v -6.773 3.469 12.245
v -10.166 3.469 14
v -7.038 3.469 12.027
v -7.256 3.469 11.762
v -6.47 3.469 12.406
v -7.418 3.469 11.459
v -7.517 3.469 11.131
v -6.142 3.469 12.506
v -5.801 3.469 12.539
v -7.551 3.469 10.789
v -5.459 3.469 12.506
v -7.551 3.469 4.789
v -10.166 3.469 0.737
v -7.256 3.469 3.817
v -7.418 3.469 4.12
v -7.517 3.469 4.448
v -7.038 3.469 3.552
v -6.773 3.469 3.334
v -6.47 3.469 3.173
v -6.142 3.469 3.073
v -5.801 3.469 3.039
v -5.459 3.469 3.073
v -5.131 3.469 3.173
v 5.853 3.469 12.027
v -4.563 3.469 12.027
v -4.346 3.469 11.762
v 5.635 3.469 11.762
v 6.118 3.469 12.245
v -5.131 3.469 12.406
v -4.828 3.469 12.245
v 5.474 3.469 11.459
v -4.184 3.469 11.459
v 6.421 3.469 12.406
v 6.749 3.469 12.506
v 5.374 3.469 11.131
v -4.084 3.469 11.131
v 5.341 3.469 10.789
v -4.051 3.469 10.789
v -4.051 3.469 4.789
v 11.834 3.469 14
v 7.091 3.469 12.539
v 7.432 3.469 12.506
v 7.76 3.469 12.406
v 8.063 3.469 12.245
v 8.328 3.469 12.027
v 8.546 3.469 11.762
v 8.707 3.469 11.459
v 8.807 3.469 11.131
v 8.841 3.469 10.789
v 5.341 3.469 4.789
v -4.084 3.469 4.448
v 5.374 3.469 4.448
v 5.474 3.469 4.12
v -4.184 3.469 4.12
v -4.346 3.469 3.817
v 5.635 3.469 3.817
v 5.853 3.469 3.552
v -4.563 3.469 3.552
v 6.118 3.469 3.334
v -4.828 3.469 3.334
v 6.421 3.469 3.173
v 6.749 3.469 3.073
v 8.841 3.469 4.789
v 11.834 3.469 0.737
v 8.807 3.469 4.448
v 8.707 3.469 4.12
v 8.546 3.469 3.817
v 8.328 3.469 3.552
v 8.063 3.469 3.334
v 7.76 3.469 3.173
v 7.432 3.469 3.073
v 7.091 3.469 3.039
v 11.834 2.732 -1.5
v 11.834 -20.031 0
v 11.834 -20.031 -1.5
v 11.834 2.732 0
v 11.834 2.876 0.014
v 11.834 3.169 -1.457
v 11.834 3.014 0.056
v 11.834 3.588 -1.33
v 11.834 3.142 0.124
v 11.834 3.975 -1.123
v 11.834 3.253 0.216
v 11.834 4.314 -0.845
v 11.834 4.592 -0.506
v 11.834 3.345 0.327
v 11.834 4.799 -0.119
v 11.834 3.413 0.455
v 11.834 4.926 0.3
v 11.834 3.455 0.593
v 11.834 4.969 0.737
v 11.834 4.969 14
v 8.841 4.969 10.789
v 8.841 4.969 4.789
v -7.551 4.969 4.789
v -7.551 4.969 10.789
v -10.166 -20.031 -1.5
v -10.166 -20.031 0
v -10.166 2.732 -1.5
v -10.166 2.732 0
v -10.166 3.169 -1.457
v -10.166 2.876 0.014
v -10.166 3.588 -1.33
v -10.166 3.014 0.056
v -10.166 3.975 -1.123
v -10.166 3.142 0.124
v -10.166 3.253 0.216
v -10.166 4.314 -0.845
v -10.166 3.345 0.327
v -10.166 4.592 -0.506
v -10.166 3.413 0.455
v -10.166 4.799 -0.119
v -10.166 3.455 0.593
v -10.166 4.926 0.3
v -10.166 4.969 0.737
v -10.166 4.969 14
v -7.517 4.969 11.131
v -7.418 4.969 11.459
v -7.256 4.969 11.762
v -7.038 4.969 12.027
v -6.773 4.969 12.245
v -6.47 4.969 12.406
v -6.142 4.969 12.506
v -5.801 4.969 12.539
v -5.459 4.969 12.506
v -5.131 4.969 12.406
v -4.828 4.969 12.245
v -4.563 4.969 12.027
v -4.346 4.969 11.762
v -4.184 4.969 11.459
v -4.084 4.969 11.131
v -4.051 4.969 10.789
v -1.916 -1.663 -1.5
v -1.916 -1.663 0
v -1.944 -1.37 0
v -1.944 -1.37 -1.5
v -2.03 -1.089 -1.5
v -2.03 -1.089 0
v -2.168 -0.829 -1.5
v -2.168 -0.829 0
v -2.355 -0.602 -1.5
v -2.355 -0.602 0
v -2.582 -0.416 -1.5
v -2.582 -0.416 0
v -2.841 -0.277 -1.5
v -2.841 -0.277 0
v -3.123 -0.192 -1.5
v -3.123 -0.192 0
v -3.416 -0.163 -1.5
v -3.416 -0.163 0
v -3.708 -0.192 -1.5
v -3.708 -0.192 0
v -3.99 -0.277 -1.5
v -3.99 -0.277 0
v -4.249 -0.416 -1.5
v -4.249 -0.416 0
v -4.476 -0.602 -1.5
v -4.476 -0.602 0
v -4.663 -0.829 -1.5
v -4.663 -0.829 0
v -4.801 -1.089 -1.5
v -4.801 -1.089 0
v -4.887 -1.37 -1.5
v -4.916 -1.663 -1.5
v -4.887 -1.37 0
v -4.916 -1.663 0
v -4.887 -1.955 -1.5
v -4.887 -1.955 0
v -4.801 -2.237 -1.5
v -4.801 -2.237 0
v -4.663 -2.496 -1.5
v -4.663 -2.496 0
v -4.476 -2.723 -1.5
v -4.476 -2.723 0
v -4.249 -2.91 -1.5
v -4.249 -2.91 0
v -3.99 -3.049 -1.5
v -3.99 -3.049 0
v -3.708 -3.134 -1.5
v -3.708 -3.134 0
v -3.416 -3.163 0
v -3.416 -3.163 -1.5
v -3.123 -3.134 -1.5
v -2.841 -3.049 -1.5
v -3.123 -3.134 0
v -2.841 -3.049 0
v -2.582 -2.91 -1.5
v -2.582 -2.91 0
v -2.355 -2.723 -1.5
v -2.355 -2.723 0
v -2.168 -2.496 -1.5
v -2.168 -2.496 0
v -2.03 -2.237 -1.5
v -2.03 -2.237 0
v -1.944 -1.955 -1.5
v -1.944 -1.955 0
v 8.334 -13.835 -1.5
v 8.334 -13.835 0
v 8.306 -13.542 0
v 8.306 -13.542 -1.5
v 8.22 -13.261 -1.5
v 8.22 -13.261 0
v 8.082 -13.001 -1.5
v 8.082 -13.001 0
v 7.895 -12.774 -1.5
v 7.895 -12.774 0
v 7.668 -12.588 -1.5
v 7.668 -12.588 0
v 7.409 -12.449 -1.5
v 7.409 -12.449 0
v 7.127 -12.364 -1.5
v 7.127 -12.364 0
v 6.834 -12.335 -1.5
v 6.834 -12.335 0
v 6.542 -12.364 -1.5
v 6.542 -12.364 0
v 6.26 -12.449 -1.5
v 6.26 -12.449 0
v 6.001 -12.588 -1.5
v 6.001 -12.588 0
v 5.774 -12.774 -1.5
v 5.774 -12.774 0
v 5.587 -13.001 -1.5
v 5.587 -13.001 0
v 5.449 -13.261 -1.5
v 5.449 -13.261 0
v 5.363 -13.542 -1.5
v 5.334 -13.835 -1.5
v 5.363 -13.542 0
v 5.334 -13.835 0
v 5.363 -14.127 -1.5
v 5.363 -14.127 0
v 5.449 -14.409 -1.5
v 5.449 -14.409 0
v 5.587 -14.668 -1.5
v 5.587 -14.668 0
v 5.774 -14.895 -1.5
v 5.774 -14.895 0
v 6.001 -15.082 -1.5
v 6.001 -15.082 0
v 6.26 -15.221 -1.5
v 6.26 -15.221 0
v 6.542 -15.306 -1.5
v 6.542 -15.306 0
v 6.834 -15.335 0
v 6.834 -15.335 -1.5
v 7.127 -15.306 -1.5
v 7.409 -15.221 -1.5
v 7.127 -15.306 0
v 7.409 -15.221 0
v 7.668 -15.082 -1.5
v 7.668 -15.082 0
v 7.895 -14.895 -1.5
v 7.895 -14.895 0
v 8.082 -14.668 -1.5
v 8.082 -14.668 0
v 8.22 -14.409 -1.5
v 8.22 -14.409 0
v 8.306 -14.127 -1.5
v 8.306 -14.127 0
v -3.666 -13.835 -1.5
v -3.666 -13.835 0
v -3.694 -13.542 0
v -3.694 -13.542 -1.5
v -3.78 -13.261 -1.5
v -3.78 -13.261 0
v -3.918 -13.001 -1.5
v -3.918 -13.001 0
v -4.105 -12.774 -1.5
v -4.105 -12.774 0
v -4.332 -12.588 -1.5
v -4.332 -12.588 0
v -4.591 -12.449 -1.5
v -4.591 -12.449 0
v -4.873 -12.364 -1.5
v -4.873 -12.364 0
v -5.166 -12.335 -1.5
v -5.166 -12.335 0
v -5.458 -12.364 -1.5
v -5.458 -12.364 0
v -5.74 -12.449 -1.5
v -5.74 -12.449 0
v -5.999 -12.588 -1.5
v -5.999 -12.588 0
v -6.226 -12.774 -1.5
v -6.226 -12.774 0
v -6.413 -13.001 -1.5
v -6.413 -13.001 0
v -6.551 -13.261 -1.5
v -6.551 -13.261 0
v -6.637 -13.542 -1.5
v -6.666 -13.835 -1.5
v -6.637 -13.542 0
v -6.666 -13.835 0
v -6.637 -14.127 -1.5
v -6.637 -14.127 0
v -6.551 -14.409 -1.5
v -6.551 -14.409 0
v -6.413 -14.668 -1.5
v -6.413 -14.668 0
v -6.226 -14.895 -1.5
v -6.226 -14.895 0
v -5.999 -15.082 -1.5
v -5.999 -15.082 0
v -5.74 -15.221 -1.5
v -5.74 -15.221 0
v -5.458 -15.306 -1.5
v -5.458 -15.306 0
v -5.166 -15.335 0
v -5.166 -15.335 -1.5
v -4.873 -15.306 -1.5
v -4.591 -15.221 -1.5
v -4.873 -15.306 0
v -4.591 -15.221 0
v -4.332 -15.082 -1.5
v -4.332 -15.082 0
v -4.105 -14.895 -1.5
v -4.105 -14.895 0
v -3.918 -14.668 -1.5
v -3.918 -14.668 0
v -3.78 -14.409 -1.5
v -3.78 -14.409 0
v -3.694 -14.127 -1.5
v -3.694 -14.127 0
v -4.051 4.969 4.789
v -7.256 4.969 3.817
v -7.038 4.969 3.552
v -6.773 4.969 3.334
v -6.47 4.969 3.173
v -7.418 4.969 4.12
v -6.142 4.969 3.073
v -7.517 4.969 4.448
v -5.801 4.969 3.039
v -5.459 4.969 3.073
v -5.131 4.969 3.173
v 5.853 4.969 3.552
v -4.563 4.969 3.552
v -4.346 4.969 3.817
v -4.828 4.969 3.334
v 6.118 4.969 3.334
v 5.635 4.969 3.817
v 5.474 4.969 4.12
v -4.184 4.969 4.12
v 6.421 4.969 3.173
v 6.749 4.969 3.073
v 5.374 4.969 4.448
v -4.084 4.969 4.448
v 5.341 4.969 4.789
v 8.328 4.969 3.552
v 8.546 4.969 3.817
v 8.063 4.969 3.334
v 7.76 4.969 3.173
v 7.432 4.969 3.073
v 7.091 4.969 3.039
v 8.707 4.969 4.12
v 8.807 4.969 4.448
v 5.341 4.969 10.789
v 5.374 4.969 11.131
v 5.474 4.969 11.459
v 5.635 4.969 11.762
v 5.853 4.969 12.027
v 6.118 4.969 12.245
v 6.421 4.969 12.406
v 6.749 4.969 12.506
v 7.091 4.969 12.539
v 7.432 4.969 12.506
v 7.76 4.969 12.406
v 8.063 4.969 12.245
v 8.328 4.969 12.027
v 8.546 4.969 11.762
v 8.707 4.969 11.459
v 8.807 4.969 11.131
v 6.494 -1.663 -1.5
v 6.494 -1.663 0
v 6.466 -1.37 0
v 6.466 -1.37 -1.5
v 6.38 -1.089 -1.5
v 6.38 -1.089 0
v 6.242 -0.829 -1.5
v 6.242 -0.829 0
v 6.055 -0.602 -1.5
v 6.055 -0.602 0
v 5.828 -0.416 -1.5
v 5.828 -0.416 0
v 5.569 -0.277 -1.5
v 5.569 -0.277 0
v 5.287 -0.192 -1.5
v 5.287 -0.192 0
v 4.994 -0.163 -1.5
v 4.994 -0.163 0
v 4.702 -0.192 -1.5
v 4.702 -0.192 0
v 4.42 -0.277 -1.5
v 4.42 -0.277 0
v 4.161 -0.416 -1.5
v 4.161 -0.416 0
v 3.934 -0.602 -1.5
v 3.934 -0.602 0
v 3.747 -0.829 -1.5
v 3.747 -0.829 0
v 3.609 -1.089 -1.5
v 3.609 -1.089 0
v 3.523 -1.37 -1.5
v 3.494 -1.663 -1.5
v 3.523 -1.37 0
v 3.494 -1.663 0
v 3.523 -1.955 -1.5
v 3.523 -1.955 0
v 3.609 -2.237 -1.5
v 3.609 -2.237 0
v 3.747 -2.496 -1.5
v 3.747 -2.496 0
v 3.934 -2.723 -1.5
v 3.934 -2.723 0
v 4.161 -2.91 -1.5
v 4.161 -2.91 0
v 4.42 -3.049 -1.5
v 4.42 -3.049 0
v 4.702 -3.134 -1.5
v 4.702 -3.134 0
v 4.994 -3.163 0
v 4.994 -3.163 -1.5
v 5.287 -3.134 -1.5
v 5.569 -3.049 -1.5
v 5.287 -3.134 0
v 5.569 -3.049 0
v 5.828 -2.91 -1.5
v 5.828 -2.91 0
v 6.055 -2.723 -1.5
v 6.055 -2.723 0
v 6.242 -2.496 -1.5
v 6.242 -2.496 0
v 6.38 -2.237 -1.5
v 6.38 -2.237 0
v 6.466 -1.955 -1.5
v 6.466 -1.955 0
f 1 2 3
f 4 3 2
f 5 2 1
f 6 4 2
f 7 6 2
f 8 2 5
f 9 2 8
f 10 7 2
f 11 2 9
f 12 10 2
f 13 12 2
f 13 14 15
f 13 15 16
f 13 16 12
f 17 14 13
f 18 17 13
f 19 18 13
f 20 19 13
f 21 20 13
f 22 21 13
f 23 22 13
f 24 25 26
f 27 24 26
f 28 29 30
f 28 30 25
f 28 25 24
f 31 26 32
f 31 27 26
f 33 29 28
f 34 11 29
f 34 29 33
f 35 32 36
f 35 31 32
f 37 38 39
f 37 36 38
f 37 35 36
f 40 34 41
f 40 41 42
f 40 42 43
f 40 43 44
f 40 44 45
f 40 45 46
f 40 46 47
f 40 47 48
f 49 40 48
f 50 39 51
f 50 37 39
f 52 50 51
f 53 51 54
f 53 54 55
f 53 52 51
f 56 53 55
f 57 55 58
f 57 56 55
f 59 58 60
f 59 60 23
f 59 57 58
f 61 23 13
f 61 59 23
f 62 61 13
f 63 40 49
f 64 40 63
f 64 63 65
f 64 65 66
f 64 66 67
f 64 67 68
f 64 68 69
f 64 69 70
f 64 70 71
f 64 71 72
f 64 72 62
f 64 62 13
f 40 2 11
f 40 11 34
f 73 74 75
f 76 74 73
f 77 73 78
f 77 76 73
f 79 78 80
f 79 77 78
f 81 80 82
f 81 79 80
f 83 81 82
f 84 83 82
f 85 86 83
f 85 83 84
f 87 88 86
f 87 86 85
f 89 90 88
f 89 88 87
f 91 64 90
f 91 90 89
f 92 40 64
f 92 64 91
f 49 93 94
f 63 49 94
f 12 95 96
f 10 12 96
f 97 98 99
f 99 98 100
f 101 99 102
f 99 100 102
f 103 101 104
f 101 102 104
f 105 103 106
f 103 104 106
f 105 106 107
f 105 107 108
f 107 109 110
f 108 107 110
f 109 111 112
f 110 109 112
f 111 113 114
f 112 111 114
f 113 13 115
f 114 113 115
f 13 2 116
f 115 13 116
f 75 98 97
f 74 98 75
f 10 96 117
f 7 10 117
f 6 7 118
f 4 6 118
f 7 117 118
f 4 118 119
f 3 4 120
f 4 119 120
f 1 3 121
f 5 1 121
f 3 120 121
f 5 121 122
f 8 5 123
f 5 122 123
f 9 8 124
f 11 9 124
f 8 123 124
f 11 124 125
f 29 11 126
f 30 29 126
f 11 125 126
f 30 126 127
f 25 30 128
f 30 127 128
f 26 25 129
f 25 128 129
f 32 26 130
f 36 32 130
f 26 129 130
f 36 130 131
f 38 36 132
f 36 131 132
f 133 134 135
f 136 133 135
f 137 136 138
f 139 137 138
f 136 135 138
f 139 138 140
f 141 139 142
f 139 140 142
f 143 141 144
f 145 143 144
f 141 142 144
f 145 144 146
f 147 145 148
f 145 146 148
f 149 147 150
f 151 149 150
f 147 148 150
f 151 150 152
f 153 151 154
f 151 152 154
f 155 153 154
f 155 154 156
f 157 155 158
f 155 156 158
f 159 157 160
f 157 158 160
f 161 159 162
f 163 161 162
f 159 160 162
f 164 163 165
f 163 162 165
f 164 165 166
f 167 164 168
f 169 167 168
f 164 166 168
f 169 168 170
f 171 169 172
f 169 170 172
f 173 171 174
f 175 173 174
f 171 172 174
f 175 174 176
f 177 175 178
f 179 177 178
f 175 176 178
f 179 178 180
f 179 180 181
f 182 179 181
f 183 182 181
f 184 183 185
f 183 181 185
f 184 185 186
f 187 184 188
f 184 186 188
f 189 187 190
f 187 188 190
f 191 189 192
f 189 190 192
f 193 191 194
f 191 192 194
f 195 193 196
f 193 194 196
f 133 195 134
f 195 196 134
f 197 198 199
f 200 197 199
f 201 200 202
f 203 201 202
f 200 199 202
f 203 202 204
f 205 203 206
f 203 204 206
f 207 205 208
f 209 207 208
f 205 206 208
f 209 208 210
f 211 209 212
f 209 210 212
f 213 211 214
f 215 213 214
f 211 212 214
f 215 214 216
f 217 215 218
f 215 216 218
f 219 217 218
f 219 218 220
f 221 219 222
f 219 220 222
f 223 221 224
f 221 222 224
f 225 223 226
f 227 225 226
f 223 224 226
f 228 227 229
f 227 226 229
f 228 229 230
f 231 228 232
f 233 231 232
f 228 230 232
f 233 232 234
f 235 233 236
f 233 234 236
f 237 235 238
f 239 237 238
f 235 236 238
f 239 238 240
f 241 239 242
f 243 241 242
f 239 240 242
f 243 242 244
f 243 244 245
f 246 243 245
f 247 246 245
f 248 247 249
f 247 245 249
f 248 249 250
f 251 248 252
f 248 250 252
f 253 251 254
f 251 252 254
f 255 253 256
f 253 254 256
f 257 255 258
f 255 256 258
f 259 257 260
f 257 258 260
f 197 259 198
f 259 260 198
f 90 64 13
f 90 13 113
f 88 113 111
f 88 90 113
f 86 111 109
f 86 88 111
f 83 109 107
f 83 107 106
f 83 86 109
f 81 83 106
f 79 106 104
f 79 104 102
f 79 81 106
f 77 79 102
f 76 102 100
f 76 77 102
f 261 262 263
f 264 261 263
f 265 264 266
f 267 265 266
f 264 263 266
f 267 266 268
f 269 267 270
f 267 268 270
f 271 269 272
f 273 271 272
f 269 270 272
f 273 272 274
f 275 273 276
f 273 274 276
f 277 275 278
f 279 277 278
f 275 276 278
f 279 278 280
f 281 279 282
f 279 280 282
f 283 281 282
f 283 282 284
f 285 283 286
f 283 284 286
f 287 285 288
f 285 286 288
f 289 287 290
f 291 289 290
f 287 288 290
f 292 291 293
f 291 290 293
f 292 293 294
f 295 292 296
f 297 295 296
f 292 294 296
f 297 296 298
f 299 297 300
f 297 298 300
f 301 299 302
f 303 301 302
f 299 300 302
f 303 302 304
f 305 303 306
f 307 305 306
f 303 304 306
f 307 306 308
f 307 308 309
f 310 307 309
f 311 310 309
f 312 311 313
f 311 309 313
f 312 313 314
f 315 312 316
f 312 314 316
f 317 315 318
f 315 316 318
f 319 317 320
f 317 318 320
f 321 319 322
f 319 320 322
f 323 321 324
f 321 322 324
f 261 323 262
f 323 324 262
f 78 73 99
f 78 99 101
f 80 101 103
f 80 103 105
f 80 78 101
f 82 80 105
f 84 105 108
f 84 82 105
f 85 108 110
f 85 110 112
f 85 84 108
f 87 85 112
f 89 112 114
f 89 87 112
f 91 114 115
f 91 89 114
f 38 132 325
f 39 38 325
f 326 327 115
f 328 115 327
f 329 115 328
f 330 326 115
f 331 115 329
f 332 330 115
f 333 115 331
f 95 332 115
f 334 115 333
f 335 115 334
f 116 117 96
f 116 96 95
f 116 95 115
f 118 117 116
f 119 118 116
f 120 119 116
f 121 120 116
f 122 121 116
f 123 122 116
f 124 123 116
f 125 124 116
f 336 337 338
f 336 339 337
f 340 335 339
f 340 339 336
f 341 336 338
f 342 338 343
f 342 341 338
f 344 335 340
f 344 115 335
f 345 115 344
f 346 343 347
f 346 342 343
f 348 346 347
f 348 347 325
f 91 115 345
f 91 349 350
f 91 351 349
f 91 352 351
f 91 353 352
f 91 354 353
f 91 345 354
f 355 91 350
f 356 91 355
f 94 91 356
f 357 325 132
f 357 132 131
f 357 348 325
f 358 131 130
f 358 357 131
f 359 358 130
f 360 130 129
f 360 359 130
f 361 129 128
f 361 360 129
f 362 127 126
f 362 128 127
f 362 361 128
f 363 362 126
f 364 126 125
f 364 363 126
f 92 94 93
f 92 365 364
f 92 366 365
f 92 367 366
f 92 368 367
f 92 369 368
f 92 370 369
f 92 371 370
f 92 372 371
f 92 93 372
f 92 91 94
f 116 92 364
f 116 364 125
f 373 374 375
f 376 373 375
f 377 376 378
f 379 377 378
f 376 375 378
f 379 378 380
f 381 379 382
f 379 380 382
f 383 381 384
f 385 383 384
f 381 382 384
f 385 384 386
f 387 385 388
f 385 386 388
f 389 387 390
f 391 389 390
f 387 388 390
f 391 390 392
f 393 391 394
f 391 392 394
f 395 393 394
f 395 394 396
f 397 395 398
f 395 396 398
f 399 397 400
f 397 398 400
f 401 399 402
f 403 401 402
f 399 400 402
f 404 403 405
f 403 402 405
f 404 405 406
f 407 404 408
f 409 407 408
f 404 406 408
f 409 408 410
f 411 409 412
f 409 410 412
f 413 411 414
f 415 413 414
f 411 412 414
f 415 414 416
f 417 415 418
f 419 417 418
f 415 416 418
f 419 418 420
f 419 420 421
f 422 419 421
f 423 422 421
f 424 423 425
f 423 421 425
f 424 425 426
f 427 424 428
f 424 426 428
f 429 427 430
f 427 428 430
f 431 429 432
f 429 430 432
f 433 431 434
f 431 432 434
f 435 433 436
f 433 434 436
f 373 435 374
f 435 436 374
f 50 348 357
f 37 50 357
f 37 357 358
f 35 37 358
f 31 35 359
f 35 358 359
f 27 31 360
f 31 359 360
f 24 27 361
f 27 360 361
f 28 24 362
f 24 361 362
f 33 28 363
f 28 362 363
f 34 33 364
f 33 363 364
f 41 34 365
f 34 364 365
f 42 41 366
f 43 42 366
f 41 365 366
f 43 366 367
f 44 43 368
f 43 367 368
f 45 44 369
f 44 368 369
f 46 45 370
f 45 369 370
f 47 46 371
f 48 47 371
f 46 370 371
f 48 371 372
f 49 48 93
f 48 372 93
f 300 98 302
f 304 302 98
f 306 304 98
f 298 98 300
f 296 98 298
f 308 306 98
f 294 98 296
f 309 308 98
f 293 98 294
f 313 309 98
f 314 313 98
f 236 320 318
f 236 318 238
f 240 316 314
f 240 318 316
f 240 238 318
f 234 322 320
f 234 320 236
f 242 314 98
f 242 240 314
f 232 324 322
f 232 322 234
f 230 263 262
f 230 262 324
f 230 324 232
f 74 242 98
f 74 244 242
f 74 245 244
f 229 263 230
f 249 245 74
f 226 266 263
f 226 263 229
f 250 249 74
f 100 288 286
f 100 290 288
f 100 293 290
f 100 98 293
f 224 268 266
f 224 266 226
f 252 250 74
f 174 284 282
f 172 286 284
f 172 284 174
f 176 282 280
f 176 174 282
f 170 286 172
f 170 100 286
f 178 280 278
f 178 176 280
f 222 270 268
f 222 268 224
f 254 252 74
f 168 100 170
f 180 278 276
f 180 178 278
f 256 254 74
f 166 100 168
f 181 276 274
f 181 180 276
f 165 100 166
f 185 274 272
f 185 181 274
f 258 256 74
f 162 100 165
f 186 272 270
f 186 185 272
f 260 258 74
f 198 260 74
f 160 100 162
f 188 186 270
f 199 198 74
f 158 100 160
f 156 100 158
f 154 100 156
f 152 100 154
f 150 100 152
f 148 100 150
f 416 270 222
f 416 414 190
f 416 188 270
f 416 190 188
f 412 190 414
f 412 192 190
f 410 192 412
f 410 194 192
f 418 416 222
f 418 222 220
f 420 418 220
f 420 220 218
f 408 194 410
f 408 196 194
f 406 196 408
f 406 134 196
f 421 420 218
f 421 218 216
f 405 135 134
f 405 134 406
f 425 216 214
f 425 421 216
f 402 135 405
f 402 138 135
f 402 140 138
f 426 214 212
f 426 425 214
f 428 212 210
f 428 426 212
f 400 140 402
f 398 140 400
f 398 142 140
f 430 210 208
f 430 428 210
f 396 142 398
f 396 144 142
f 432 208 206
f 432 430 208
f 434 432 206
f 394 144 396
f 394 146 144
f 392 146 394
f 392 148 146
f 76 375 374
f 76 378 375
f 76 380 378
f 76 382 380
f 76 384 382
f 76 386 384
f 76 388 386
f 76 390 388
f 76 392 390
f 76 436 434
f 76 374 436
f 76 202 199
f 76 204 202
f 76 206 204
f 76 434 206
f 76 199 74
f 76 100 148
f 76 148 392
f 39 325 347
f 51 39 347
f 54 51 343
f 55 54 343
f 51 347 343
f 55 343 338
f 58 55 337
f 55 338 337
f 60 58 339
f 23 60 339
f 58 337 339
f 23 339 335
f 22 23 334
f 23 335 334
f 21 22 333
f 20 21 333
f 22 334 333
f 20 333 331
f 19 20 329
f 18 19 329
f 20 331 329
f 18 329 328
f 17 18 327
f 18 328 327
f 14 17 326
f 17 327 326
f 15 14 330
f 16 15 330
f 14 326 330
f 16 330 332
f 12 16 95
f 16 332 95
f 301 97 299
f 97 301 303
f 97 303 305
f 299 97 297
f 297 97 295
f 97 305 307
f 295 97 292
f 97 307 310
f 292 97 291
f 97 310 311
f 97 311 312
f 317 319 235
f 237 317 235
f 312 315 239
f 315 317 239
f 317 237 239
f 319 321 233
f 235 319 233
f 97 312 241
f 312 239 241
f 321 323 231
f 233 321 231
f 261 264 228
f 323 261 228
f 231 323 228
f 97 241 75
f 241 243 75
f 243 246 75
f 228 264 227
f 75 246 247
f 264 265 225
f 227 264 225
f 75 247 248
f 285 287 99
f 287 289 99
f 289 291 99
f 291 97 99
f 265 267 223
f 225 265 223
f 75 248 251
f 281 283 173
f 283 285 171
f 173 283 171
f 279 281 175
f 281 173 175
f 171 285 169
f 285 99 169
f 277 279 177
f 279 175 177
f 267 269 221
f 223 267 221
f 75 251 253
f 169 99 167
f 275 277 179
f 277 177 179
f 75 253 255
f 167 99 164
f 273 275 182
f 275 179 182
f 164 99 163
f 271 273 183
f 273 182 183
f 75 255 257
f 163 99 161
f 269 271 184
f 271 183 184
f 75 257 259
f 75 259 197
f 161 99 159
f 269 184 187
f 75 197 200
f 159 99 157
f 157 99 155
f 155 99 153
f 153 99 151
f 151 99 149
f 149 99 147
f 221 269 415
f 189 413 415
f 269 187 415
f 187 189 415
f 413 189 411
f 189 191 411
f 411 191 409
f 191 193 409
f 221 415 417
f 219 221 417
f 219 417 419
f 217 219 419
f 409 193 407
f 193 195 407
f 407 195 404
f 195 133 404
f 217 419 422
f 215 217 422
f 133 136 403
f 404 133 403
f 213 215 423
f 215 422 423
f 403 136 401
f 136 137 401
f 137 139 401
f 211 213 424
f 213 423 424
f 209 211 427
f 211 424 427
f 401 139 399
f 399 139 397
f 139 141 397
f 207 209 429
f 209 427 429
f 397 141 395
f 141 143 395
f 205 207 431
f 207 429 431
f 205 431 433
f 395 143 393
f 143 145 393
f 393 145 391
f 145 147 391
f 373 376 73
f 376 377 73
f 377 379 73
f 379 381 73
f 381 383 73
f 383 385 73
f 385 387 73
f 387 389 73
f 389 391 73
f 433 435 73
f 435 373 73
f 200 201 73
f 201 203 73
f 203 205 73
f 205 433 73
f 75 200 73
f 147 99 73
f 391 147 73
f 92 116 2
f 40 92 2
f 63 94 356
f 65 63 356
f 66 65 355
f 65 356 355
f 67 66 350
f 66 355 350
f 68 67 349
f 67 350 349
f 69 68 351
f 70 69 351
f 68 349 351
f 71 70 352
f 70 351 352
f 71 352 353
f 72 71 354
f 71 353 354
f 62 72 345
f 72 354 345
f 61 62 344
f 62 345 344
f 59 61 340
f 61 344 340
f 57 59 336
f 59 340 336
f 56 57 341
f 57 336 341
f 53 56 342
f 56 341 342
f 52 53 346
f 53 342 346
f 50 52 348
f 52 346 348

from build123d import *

# Parameters (mm, degrees)
SKETCH1_W                    = 22
SKETCH1_H                    = 25
SKETCH1_R                    = 1.5
BASE_FLANGE1_DEPTH           = 1.5
EDGE_FLANGE1_STRIP_W         = 7.4732
EDGE_FLANGE1_STRIP_H         = 1.5
EDGE_FLANGE1_STRIP_CUT_DEPTH = 22
EDGE_FLANGE1_DEPTH           = 22
CUT_EXTRUDE1_DEPTH           = 10


# Sheet-metal steps are written as plain solids
with BuildPart() as part:
    # Sketch1 → Base-Flange1 (new body)
    with BuildSketch(Plane.XY):
        with Locations((0.834482759, -7.531034483)):
            Rectangle(SKETCH1_W, SKETCH1_H)
        with Locations((6.834482759, -13.834829283)):
            Circle(SKETCH1_R, mode=Mode.SUBTRACT)
        with Locations((-5.165517241, -13.834829283)):
            Circle(SKETCH1_R, mode=Mode.SUBTRACT)
        with Locations((-3.415517241, -1.662801421)):
            Circle(SKETCH1_R, mode=Mode.SUBTRACT)
        with Locations((4.994482759, -1.662801421)):
            Circle(SKETCH1_R, mode=Mode.SUBTRACT)
    extrude(amount=-BASE_FLANGE1_DEPTH)

    # Edge-Flange1 strip (across the edge) → Edge-Flange1 strip cut (cut)
    with BuildSketch(Plane(origin=(11.834482759, 4.968965517, 0), x_dir=(0, -1, 0), z_dir=(-1, 0, 0))):
        with Locations((-1.5, -0.75)):
            Rectangle(EDGE_FLANGE1_STRIP_W, EDGE_FLANGE1_STRIP_H)
    extrude(amount=EDGE_FLANGE1_STRIP_CUT_DEPTH, mode=Mode.SUBTRACT)

    # Edge-Flange1 section (across the edge) → Edge-Flange1 (add)
    with BuildSketch(Plane(origin=(11.834482759, 4.968965517, 0), x_dir=(0, -1, 0), z_dir=(-1, 0, 0))):
        with BuildLine():
            Line((0, 0.7366), (0, 14))
            Line((0, 14), (1.5, 14))
            Line((1.5, 14), (1.5, 0.7366))
            ThreePointArc((1.5, 0.7366), (1.715745145, 0.215745145), (2.2366, 0))
            Line((2.2366, 0), (2.2366, -1.5))
            ThreePointArc((2.2366, -1.5), (0.655084973, -0.844915027), (0, 0.7366))
        make_face()
    extrude(amount=EDGE_FLANGE1_DEPTH)

    # Sketch11 → Cut-Extrude1 (cut)
    with BuildSketch(Plane(origin=(0, 4.968965517, 0), x_dir=(1, 0, 0), z_dir=(0, 1, 0))):
        with BuildLine():
            Line((-4.050745128, -10.789495208), (-4.050745128, -4.789495208))
            ThreePointArc((-4.050745128, -4.789495208), (-5.800745128, -3.039495208), (-7.550745128, -4.789495208))
            Line((-7.550745128, -4.789495208), (-7.550745128, -10.789495208))
            ThreePointArc((-7.550745128, -10.789495208), (-5.800745128, -12.539495208), (-4.050745128, -10.789495208))
        make_face()
        with BuildLine():
            Line((8.840531004, -10.789495208), (8.840531004, -4.789495208))
            ThreePointArc((8.840531004, -4.789495208), (7.090531004, -3.039495208), (5.340531004, -4.789495208))
            Line((5.340531004, -4.789495208), (5.340531004, -10.789495208))
            ThreePointArc((5.340531004, -10.789495208), (7.090531004, -12.539495208), (8.840531004, -10.789495208))
        make_face()
    extrude(amount=-CUT_EXTRUDE1_DEPTH, mode=Mode.SUBTRACT)


solid = part.part
